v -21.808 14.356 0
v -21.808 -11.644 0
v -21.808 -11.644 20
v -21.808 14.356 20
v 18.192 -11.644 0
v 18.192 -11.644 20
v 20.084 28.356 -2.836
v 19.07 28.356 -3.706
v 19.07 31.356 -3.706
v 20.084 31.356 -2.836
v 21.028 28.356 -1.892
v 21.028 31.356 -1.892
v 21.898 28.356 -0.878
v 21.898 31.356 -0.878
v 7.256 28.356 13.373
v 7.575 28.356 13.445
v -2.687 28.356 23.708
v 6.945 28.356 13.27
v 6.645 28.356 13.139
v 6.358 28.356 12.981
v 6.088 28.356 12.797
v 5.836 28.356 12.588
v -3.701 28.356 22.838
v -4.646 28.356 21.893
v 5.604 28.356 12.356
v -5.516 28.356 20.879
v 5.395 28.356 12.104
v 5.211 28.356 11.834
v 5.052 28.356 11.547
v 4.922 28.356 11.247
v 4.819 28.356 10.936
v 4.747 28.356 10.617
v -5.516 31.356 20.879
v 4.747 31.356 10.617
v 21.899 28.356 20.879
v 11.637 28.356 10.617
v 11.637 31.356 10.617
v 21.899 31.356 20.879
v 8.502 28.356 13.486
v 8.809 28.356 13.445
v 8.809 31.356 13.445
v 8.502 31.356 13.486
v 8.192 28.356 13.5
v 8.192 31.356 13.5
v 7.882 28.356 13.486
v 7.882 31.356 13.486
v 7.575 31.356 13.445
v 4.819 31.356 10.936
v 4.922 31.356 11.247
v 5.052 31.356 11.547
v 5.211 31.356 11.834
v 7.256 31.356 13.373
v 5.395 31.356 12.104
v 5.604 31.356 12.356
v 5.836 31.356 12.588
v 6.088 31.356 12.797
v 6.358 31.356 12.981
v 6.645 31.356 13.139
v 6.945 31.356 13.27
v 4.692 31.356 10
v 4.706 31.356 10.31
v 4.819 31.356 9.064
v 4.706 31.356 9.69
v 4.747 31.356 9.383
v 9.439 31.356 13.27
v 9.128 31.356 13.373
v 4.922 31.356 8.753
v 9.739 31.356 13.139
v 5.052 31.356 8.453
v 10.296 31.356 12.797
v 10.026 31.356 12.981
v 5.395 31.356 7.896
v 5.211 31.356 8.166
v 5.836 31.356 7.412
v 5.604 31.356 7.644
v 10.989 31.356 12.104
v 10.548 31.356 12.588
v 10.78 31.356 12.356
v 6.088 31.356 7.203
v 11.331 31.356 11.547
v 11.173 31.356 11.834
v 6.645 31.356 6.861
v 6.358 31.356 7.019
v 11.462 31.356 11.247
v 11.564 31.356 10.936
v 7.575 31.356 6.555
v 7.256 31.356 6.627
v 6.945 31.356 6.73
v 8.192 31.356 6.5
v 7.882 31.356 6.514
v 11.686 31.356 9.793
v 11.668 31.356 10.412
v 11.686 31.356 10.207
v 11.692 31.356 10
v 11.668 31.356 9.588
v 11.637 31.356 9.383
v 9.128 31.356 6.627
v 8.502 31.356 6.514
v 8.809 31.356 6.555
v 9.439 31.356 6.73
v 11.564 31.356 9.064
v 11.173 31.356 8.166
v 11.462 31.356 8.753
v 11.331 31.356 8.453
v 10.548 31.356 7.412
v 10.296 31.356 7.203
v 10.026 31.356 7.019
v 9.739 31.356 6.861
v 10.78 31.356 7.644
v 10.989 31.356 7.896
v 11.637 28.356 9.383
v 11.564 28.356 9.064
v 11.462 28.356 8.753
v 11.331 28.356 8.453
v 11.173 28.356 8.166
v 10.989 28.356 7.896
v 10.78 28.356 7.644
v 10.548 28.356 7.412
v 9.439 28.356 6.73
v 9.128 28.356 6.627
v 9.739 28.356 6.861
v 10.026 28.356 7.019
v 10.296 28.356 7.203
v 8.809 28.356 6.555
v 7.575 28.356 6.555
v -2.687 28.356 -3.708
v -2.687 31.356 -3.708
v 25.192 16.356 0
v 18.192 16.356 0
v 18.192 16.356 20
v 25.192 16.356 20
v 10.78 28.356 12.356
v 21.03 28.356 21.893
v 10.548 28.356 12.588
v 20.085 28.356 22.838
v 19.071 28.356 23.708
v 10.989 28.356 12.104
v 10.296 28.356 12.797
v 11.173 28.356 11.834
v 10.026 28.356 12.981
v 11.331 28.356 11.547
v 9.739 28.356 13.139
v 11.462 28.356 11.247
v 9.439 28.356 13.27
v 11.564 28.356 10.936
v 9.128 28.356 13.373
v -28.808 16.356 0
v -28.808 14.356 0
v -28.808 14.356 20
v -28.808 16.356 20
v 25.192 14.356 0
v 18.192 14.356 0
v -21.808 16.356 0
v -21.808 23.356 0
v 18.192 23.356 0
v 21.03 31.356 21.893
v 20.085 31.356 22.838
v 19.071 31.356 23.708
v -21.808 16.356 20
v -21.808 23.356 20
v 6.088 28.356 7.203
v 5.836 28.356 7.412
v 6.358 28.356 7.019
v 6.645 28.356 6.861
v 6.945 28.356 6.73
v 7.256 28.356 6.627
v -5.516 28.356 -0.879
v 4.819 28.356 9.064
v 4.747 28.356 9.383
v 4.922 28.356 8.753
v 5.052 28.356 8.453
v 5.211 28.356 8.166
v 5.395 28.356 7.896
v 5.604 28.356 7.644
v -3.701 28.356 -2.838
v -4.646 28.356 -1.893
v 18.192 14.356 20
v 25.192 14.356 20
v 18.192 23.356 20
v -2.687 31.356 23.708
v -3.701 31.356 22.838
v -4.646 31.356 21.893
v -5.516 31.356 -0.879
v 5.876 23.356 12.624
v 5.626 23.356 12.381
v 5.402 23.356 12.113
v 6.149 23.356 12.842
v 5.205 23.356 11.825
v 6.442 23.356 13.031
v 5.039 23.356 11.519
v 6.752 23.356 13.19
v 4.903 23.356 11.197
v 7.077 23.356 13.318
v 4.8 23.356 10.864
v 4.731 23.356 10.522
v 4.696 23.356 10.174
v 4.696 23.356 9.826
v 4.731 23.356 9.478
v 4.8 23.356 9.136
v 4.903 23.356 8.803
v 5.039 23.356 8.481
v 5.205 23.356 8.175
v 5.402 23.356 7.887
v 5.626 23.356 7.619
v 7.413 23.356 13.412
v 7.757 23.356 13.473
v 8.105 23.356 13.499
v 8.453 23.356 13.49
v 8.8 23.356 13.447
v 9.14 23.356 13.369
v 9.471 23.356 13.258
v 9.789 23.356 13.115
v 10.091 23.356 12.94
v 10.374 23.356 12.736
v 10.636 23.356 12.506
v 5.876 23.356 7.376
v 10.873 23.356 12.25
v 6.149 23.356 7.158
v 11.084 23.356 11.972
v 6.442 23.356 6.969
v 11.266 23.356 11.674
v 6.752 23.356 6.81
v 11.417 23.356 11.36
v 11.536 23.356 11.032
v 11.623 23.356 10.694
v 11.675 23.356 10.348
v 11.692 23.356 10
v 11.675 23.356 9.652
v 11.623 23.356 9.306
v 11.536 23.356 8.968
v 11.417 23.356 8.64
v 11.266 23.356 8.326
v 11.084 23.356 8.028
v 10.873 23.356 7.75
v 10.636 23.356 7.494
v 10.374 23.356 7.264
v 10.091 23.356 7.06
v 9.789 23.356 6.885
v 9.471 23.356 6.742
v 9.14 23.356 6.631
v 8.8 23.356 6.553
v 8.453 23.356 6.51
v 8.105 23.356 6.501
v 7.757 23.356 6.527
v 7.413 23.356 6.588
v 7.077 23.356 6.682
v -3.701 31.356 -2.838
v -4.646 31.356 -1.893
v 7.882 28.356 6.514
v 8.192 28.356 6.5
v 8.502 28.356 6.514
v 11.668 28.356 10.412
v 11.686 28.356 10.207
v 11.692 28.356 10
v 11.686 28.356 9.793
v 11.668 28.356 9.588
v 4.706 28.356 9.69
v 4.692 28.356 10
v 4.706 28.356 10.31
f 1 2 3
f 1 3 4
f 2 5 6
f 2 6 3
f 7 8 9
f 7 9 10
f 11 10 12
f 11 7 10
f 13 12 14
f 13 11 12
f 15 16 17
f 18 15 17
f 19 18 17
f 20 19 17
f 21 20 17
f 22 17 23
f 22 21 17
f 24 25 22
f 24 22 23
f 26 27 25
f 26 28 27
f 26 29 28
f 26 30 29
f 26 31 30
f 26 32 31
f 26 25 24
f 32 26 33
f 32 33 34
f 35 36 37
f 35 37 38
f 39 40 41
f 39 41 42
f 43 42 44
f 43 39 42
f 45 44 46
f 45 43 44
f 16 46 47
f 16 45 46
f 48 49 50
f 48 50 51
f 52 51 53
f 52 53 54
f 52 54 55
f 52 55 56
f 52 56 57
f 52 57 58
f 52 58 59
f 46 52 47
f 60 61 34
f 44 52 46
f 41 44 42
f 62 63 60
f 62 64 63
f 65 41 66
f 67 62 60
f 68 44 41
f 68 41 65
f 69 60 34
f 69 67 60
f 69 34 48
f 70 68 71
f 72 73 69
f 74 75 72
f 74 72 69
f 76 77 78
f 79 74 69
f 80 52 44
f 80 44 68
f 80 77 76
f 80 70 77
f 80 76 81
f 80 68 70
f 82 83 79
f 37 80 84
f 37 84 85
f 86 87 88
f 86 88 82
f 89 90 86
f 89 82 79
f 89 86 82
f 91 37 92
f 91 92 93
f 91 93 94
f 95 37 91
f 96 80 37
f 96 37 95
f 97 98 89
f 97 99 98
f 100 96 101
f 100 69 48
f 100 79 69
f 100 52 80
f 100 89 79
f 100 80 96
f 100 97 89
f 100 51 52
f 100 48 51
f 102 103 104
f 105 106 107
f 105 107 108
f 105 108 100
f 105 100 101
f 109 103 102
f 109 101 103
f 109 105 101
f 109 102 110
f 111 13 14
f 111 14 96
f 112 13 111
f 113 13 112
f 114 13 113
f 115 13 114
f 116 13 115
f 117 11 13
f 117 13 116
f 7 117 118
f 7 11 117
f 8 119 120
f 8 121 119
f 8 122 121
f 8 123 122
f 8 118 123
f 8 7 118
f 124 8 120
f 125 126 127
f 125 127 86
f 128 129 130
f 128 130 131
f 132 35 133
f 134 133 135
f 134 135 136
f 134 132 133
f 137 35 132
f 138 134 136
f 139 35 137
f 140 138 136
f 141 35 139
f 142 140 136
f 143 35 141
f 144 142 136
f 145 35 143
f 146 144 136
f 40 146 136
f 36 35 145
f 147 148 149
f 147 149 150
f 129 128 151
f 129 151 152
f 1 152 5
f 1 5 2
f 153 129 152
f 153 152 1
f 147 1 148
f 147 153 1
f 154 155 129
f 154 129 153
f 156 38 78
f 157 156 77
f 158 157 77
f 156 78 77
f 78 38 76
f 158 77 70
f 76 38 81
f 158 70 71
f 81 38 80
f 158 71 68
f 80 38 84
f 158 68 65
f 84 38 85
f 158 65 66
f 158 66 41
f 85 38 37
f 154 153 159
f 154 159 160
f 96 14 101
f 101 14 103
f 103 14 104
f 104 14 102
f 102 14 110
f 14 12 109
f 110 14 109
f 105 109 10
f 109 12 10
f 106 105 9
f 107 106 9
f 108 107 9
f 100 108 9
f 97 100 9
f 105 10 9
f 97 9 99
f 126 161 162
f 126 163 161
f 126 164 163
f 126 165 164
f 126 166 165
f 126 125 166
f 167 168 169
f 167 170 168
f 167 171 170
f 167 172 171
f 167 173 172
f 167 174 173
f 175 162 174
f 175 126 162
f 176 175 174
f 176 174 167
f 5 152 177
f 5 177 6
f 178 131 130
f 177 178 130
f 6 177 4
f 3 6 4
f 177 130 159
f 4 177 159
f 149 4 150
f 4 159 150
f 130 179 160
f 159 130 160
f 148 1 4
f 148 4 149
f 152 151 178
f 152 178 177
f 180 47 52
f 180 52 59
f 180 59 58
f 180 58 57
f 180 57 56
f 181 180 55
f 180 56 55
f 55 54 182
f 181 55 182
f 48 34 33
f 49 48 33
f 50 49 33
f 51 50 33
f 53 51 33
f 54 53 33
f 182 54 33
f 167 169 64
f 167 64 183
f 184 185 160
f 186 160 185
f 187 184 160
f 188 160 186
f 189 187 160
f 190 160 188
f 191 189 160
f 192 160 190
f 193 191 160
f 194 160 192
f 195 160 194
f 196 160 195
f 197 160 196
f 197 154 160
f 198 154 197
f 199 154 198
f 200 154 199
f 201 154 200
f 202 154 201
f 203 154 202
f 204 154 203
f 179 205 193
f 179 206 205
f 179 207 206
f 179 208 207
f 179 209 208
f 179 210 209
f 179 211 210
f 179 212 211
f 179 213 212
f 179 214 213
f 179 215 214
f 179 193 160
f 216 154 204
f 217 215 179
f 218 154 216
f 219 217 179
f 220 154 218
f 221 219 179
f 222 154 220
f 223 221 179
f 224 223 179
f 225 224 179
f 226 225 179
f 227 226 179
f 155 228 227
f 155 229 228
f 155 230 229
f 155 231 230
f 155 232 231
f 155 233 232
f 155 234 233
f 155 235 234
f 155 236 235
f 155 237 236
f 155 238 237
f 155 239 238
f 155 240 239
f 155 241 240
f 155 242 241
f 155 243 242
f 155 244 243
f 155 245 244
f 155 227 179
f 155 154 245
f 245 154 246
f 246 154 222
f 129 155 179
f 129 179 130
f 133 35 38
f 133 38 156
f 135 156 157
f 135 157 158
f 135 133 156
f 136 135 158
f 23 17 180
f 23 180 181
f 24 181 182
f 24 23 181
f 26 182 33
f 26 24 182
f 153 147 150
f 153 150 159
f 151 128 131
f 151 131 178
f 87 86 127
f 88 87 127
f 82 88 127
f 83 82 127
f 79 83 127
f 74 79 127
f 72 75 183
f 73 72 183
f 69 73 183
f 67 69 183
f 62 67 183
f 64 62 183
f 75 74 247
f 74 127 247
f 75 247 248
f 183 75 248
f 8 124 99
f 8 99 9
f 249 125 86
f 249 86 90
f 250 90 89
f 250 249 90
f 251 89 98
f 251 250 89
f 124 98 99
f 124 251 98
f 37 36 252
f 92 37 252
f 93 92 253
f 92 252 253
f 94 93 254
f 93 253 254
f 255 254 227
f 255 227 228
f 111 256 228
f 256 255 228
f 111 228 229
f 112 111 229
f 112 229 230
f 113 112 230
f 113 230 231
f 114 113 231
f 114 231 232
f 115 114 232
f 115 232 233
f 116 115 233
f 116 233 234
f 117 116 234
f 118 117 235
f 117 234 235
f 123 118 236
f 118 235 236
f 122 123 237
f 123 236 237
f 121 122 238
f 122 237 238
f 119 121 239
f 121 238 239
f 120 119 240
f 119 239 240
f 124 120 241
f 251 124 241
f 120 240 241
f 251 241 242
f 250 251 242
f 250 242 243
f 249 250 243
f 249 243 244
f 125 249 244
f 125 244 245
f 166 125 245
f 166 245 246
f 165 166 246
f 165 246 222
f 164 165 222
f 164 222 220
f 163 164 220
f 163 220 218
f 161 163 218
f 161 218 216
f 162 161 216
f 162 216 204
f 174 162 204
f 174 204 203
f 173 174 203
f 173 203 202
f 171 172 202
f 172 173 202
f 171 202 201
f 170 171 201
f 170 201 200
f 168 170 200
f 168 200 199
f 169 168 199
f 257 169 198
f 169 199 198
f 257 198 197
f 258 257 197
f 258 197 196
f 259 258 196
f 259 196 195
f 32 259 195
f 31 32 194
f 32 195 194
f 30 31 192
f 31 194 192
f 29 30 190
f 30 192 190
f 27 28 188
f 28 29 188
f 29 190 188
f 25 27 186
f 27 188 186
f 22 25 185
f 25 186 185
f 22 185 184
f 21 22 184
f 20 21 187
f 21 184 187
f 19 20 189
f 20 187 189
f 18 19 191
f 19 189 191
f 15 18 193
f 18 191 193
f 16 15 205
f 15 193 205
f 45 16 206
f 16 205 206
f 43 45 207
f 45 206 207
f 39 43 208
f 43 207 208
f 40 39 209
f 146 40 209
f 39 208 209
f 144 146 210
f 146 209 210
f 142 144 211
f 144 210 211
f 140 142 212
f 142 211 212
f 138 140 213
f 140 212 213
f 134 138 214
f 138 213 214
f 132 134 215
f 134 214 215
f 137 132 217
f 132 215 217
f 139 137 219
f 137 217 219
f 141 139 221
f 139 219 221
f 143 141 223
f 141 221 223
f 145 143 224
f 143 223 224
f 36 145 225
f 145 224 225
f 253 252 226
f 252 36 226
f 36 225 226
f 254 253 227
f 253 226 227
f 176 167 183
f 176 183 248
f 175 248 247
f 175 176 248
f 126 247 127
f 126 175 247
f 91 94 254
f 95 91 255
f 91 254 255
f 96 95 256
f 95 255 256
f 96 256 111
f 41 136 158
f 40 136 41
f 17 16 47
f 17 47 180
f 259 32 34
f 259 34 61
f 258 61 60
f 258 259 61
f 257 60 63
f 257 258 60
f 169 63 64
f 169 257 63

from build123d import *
from build123d.topology import SkipClean

# Parameters (mm, degrees)
EXTRUSION1_DEPTH = 20
ESQUISSE2_R      = 3.5
EXTRUSION2_DEPTH = 8
EXTRUSION3_START = -3
EXTRUSION3_DEPTH = 3


with BuildPart() as part:
    # Esquisse1 → Extrusion1 (new body)
    with BuildSketch(Plane.XY):
        Polygon((-21.808080808, -11.643556434), (-21.808080808, 14.356443566), (-28.808080808, 14.356443566), (-28.808080808, 16.356443566), (-21.808080808, 16.356443566), (-21.808080808, 23.356443566), (18.191919192, 23.356443566), (18.191919192, 16.356443566), (25.191919192, 16.356443566), (25.191919192, 14.356443566), (18.191919192, 14.356443566), (18.191919192, -11.643556434), align=None)
    extrude(amount=EXTRUSION1_DEPTH)

    # Esquisse2 → Extrusion2 (add)
    with BuildSketch(Plane(origin=(0, 23.356443566, 0), x_dir=(1, 0, 0), z_dir=(0, 1, 0))):
        with Locations((8.191919192, -10)):
            Circle(ESQUISSE2_R)
    extrude(amount=EXTRUSION2_DEPTH)

    # Esquisse3 → Extrusion3 (add)
    with SkipClean():  # the faces are left unmerged after this step: merging them gives an invalid solid
        with BuildSketch(Plane(origin=(0, 31.356443566, 0), x_dir=(1, 0, 0), z_dir=(0, 1, 0)).offset(EXTRUSION3_START)):
            with BuildLine():
                Line((4.746696028, -9.383203961), (-5.515585224, 0.879077291))
                ThreePointArc((-5.515585224, 0.879077291), (-4.182449479, 2.374368671), (-2.687158099, 3.707504416))
                Line((-2.687158099, 3.707504416), (7.575123153, -6.554776836))
                ThreePointArc((7.575123153, -6.554776836), (8.191919192, -6.5), (8.808715231, -6.554776836))
                Line((8.808715231, -6.554776836), (19.069778625, 3.706286557))
                ThreePointArc((19.069778625, 3.706286557), (20.565077985, 2.373158793), (21.898205749, 0.877859433))
                Line((21.898205749, 0.877859433), (11.637142355, -9.383203961))
                ThreePointArc((11.637142355, -9.383203961), (11.691919192, -10), (11.637142355, -10.616796039))
                Line((11.637142355, -10.616796039), (21.899423607, -20.879077291))
                ThreePointArc((21.899423607, -20.879077291), (20.566287863, -22.374368671), (19.070996483, -23.707504416))
                Line((19.070996483, -23.707504416), (8.808715231, -13.445223164))
                ThreePointArc((8.808715231, -13.445223164), (8.191919192, -13.5), (7.575123153, -13.445223164))
                Line((7.575123153, -13.445223164), (-2.687158099, -23.707504416))
                ThreePointArc((-2.687158099, -23.707504416), (-4.182449479, -22.374368671), (-5.515585224, -20.879077291))
                Line((-5.515585224, -20.879077291), (4.746696028, -10.616796039))
                ThreePointArc((4.746696028, -10.616796039), (4.691919192, -10), (4.746696028, -9.383203961))
            make_face()
        extrude(amount=EXTRUSION3_DEPTH)


solid = part.part
